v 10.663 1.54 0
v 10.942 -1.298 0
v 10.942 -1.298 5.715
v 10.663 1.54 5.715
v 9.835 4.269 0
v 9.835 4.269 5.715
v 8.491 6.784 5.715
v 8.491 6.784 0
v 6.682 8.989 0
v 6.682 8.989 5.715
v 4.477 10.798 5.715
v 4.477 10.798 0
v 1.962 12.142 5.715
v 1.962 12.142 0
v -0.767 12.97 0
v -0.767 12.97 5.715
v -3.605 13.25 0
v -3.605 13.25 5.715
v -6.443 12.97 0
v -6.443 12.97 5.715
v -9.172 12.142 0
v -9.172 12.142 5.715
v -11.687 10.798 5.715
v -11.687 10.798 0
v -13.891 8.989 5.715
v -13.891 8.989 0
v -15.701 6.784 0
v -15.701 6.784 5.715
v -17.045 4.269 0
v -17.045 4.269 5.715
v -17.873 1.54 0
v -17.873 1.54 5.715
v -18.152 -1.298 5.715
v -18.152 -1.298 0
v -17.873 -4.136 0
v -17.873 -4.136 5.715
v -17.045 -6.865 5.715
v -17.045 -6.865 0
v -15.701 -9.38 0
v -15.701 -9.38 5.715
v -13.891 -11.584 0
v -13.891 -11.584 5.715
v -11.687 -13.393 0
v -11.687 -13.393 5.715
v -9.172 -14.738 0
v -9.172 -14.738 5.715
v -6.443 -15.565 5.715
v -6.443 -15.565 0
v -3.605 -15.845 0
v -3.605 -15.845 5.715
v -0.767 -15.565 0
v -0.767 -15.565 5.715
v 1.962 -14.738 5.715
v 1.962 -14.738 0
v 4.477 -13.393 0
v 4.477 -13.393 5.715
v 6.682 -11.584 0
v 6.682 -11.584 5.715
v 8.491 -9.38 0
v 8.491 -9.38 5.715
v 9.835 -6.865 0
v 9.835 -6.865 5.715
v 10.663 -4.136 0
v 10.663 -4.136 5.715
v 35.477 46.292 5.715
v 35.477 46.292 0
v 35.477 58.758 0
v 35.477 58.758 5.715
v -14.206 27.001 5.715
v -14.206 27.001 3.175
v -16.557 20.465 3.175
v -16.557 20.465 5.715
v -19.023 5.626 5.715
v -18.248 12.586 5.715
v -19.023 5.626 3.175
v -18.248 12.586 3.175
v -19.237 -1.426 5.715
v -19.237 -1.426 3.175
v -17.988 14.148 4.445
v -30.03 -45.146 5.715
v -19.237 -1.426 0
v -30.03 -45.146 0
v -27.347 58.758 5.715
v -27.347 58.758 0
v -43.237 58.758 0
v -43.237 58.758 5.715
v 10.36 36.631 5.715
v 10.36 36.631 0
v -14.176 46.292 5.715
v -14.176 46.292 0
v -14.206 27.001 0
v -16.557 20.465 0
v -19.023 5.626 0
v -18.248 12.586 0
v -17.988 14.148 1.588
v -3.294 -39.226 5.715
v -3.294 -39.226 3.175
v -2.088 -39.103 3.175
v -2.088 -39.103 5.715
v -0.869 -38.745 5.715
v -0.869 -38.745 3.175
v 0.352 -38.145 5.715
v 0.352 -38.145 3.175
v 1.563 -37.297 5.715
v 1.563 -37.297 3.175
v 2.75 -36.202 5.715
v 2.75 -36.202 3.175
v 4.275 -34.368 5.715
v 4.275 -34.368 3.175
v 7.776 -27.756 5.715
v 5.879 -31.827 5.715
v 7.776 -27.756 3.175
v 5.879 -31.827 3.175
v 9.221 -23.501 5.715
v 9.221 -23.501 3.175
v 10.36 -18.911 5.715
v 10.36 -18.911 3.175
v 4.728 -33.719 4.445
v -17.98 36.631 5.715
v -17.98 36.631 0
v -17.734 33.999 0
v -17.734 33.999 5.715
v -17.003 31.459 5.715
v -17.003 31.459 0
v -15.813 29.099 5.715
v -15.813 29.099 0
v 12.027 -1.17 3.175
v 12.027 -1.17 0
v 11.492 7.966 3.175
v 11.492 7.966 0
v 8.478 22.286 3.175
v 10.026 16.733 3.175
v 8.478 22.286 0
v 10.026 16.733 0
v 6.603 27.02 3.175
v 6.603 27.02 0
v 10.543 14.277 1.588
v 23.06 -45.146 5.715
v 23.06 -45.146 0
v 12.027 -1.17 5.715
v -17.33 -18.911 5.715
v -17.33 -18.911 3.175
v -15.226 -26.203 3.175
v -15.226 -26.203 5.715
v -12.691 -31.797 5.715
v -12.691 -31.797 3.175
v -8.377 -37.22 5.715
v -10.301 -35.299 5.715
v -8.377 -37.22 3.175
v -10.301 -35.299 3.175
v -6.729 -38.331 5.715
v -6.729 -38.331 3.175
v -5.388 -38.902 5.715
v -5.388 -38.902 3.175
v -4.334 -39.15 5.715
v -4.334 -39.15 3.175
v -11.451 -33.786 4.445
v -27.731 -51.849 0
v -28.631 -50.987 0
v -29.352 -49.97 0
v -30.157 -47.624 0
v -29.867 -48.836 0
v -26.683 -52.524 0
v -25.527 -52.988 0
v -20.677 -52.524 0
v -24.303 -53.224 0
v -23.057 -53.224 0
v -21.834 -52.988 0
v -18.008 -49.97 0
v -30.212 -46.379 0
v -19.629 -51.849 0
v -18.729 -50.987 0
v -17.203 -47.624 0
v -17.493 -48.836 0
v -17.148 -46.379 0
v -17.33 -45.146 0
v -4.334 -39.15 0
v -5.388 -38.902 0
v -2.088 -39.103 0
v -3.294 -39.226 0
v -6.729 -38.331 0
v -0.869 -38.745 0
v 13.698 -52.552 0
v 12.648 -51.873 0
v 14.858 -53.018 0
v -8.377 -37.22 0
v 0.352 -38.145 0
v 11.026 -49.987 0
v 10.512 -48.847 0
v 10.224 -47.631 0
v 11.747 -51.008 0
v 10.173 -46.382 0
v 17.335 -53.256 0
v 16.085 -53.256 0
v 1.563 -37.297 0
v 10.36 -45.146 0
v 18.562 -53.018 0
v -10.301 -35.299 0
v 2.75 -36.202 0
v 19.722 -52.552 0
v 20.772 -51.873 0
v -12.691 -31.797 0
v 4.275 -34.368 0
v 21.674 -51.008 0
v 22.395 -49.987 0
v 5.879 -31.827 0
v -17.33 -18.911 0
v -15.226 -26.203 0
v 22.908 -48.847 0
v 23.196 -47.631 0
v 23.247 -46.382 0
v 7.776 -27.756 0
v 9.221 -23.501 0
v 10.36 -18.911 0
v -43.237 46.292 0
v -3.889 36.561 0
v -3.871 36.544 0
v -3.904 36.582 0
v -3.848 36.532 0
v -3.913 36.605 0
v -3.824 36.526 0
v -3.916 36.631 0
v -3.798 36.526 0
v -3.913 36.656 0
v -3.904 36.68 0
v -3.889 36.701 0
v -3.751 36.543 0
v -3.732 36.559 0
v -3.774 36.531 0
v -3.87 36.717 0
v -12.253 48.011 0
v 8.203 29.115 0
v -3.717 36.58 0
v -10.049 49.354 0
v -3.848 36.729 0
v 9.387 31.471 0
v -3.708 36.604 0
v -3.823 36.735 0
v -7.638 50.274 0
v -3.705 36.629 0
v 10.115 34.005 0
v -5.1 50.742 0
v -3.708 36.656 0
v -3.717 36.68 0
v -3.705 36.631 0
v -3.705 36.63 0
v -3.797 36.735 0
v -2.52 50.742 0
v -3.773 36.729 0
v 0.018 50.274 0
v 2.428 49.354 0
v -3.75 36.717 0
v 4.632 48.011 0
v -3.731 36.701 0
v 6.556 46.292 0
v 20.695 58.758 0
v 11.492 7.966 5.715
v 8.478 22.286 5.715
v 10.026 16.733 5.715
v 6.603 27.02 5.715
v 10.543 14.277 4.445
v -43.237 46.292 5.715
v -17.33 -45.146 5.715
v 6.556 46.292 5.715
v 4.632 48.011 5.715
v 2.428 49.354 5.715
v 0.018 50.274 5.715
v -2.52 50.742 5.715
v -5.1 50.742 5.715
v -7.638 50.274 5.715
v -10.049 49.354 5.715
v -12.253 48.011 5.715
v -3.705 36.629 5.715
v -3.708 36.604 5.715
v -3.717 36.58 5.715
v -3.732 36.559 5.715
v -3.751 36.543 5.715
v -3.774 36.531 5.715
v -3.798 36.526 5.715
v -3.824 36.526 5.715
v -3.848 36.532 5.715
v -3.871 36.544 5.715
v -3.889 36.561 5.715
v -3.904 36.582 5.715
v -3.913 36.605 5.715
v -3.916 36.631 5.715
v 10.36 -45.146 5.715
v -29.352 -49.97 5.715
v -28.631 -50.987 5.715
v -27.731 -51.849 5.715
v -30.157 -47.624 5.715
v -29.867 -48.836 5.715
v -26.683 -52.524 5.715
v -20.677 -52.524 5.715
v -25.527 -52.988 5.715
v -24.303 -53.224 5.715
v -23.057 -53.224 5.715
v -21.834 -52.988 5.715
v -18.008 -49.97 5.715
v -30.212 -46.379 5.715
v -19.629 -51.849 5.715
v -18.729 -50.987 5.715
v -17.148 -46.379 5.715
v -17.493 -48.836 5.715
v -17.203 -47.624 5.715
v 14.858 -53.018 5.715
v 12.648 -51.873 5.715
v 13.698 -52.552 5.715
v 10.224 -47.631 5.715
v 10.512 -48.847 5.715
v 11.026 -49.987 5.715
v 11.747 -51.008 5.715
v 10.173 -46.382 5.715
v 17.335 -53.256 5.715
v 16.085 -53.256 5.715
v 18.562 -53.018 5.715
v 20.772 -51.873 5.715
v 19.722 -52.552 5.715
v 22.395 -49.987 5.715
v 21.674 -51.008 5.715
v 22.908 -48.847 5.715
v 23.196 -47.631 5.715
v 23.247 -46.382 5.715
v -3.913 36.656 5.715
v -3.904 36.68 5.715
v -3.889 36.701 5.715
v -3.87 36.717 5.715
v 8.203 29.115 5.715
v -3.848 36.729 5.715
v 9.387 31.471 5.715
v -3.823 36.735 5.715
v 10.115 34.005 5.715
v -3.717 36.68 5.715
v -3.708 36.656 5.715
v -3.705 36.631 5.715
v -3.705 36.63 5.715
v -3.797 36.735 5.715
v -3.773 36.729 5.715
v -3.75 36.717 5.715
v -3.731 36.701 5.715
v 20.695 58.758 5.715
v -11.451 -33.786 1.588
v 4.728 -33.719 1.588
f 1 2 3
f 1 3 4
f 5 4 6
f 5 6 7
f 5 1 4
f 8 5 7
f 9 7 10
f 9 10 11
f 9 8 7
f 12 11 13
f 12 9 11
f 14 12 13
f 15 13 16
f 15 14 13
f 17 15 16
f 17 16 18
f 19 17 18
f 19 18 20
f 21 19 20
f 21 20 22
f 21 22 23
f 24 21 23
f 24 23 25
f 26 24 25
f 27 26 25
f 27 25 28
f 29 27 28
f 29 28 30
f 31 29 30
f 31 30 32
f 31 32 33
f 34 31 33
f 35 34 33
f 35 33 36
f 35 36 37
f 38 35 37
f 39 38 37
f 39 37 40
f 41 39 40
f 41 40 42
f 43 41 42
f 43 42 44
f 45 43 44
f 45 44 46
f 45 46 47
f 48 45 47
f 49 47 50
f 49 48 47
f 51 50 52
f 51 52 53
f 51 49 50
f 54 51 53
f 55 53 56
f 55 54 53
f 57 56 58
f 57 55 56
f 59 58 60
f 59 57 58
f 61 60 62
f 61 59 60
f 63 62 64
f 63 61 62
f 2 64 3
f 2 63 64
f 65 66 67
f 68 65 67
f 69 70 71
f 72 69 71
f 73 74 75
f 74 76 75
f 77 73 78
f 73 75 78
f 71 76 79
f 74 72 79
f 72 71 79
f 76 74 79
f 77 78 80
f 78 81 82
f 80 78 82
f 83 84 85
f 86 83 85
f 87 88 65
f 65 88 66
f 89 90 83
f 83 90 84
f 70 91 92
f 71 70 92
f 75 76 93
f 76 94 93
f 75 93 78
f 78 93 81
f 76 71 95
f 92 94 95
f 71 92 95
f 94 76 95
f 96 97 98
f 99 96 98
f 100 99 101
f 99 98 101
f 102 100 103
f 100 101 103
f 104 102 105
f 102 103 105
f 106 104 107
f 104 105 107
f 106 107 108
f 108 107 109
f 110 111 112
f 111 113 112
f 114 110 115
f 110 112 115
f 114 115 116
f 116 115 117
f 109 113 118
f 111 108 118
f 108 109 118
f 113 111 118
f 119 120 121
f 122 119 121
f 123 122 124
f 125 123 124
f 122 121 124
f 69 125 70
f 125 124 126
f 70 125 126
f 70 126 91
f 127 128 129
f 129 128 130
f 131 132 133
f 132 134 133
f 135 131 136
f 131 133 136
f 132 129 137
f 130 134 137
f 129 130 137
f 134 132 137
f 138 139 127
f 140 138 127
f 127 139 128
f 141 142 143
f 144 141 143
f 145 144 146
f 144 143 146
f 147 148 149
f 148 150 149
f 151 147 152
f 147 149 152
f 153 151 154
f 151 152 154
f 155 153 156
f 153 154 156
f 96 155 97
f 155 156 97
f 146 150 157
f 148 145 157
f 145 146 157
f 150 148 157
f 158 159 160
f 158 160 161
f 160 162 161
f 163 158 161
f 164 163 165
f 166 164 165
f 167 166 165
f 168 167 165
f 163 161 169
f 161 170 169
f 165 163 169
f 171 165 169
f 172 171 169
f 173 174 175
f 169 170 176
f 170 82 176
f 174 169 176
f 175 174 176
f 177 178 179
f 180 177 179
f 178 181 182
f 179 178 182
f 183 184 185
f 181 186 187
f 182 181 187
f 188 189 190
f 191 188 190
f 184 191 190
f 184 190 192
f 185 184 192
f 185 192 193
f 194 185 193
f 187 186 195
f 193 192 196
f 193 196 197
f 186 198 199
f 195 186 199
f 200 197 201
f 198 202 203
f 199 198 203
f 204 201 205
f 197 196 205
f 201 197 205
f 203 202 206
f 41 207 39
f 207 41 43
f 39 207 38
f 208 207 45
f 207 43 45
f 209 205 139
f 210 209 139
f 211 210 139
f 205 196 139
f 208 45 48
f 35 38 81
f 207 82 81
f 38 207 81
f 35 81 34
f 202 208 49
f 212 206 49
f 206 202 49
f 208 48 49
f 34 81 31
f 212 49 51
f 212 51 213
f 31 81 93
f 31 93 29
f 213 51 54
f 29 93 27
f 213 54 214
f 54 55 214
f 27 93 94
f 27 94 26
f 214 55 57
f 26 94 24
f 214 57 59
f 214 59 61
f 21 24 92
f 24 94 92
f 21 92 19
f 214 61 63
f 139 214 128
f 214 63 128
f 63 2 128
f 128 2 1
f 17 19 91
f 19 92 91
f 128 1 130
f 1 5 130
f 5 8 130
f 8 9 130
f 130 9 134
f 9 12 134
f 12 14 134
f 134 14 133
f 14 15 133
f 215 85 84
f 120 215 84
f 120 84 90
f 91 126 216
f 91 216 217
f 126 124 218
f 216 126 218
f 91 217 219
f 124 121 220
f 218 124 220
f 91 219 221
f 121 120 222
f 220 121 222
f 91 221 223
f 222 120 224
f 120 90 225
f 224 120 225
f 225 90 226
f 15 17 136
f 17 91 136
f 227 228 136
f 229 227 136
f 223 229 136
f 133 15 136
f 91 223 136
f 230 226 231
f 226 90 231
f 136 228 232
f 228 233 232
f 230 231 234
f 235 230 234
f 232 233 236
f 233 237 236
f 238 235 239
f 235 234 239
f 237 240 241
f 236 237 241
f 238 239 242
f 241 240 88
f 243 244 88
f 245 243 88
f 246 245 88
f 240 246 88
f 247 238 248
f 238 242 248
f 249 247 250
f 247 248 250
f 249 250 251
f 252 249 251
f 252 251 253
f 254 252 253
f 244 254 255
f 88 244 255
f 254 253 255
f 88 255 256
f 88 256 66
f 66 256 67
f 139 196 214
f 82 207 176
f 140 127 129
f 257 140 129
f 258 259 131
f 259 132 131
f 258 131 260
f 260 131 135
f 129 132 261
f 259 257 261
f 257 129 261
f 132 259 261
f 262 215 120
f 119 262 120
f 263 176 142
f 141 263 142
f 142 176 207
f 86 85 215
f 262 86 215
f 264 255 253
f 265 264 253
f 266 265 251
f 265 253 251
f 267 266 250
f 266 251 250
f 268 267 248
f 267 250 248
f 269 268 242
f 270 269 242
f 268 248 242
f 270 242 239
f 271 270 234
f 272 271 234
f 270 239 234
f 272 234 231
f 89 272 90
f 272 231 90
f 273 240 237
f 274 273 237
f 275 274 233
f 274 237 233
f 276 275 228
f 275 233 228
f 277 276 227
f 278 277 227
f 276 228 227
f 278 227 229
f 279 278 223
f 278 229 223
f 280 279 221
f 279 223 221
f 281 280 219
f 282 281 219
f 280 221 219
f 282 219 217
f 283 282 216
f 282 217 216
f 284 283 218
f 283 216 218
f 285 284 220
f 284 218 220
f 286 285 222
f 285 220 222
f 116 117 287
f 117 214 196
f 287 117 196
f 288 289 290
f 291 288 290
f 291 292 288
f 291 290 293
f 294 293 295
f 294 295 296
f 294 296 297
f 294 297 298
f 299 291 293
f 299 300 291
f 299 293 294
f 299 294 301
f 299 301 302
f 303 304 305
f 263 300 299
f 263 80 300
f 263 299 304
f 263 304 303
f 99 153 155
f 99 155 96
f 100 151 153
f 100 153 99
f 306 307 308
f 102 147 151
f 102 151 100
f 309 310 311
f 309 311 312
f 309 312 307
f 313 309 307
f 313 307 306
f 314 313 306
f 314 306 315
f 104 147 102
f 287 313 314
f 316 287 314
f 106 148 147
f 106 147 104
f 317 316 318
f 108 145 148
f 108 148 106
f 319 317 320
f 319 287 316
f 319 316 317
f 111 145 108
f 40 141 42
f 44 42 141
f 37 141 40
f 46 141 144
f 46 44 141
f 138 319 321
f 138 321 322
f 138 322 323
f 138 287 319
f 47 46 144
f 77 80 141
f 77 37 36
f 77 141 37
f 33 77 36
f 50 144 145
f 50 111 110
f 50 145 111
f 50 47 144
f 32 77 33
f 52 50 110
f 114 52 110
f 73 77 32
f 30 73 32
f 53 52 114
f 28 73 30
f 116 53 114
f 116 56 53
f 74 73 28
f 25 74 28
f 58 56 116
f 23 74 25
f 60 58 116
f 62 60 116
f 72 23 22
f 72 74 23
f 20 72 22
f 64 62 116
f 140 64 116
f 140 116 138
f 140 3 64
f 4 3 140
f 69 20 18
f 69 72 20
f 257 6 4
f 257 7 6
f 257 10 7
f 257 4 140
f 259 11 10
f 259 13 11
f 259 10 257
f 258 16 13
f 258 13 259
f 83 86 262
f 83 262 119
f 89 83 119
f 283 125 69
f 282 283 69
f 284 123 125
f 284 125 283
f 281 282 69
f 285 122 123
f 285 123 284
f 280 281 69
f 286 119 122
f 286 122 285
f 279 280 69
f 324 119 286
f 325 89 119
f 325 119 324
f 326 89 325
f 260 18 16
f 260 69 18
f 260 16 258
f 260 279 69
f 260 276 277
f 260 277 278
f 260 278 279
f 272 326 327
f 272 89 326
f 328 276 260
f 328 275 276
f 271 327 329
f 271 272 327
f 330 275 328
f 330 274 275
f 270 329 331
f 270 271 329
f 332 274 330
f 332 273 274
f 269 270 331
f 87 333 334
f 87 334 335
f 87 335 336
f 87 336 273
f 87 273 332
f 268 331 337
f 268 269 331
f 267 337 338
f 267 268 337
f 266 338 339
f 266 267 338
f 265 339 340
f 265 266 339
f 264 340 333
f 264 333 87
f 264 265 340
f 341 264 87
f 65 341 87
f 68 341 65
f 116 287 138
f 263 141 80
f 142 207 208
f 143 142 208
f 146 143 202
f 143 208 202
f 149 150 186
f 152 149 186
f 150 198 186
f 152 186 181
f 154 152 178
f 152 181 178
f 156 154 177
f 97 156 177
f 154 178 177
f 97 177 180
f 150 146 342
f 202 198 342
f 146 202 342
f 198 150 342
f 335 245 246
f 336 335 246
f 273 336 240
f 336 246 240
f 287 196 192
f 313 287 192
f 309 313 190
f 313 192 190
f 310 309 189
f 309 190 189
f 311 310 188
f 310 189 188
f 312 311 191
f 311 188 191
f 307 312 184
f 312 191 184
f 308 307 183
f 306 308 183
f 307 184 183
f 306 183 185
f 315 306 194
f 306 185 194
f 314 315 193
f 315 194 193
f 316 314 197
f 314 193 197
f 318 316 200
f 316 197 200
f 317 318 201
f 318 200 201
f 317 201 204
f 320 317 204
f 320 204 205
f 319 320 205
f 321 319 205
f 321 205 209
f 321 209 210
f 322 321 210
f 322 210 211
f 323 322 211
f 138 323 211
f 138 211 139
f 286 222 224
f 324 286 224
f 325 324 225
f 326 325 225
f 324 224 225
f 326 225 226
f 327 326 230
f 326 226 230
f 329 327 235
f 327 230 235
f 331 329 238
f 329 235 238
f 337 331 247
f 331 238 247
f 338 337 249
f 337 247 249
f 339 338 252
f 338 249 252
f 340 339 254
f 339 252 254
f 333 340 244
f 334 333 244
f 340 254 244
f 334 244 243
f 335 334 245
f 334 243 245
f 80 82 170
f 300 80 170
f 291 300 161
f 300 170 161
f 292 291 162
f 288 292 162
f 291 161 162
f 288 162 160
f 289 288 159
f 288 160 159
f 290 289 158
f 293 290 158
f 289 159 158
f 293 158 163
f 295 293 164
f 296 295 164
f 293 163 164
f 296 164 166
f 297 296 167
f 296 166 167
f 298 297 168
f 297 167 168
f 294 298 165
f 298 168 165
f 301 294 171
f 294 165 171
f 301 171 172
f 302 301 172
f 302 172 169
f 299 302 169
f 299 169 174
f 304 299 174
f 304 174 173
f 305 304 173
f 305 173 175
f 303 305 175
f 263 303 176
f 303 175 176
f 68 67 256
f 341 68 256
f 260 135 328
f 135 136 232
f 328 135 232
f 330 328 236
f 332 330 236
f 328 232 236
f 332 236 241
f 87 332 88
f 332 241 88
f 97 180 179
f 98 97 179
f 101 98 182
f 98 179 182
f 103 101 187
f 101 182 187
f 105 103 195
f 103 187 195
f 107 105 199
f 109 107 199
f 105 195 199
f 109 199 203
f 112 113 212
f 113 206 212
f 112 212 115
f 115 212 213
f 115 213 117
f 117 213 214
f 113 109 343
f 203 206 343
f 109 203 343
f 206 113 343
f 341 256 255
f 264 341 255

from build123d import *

# Parameters (mm, degrees)
F0_R     = 14.5472790553
F1_DEPTH = 3.175
F2_DEPTH = 5.715


with BuildPart() as f1:
    # F0 (on Top) → F1 (new body)
    with BuildSketch(Plane.XY):
        with BuildLine():
            add(Edge.make_bspline(
                [(-17.3302307441, -18.9114744135), (-12.7840517895, -39.3035737815), (-3.2940015008, -39.2257868182)],
                knots=[5.1919648614, 5.1919648614, 5.1919648614, 6.2831853072, 6.2831853072, 6.2831853072], degree=2, weights=[1, 0.854810781, 1]))
            add(Edge.make_bspline(
                [(-3.2940015008, -39.2257868182), (6.123923112, -39.1485910465), (10.3601545856, -18.9114744135)],
                knots=[0, 0, 0, 1.0844638725, 1.0844638725, 1.0844638725], degree=2, weights=[1, 0.8565590272, 1]))
            add(Edge.make_bspline(
                [(10.3601545856, -18.9114744135), (12.1044870422, -10.5785351982), (12.0273641605, -1.1695031996)],
                knots=[1.0844638725, 1.0844638725, 1.0844638725, 1.5707963268, 1.5707963268, 1.5707963268], degree=2, weights=[1, 0.9705804868, 1]))
            add(Edge.make_bspline(
                [(12.0273641605, -1.1695031996), (11.88861373, 15.7581220548), (6.6027932897, 27.0196823223)],
                knots=[1.5707963268, 1.5707963268, 1.5707963268, 2.4103546369, 2.4103546369, 2.4103546369], degree=2, weights=[1, 0.9131789699, 1]))
            ThreePointArc((6.6027932897, 27.0196823223), (-3.7977289586, 22.4602209118), (-14.2062252861, 27.0014493351))
            add(Edge.make_bspline(
                [(-14.2062252861, 27.0014493351), (-19.3770142282, 15.6392708689), (-19.2371374573, -1.4257685052)],
                knots=[3.8667963971, 3.8667963971, 3.8667963971, 4.7123889804, 4.7123889804, 4.7123889804], degree=2, weights=[1, 0.9119451548, 1]))
            add(Edge.make_bspline(
                [(-19.2371374573, -1.4257685052), (-19.1611285396, -10.6988963006), (-17.3302307441, -18.9114744135)],
                knots=[4.7123889804, 4.7123889804, 4.7123889804, 5.1919648614, 5.1919648614, 5.1919648614], degree=2, weights=[1, 0.9713883601, 1]))
        make_face()
        with Locations((-3.6048866484, -1.2976358524)):
            Circle(F0_R, mode=Mode.SUBTRACT)
    extrude(amount=F1_DEPTH)

    # F0 (on Top) → F2 (join)
    with BuildSketch(Plane.XY):
        with BuildLine():
            add(Edge.make_bspline(
                [(-17.3302307441, -18.9114744135), (-12.7840517895, -39.3035737815), (-3.2940015008, -39.2257868182)],
                knots=[5.1919648614, 5.1919648614, 5.1919648614, 6.2831853072, 6.2831853072, 6.2831853072], degree=2, weights=[1, 0.854810781, 1]))
            add(Edge.make_bspline(
                [(-3.2940015008, -39.2257868182), (6.123923112, -39.1485910465), (10.3601545856, -18.9114744135)],
                knots=[0, 0, 0, 1.0844638725, 1.0844638725, 1.0844638725], degree=2, weights=[1, 0.8565590272, 1]))
            add(Edge.make_bspline(
                [(10.3601545856, -18.9114744135), (12.1044870422, -10.5785351982), (12.0273641605, -1.1695031996)],
                knots=[1.0844638725, 1.0844638725, 1.0844638725, 1.5707963268, 1.5707963268, 1.5707963268], degree=2, weights=[1, 0.9705804868, 1]))
            add(Edge.make_bspline(
                [(12.0273641605, -1.1695031996), (11.88861373, 15.7581220548), (6.6027932897, 27.0196823223)],
                knots=[1.5707963268, 1.5707963268, 1.5707963268, 2.4103546369, 2.4103546369, 2.4103546369], degree=2, weights=[1, 0.9131789699, 1]))
            ThreePointArc((6.6027932897, 27.0196823223), (-3.7977289586, 22.4602209118), (-14.2062252861, 27.0014493351))
            add(Edge.make_bspline(
                [(-14.2062252861, 27.0014493351), (-19.3770142282, 15.6392708689), (-19.2371374573, -1.4257685052)],
                knots=[3.8667963971, 3.8667963971, 3.8667963971, 4.7123889804, 4.7123889804, 4.7123889804], degree=2, weights=[1, 0.9119451548, 1]))
            add(Edge.make_bspline(
                [(-19.2371374573, -1.4257685052), (-19.1611285396, -10.6988963006), (-17.3302307441, -18.9114744135)],
                knots=[4.7123889804, 4.7123889804, 4.7123889804, 5.1919648614, 5.1919648614, 5.1919648614], degree=2, weights=[1, 0.9713883601, 1]))
        make_face()
        with Locations((-3.6048866484, -1.2976358524)):
            Circle(F0_R, mode=Mode.SUBTRACT)
        with BuildLine():
            add(Edge.make_bspline(
                [(10.3601545856, -18.9114744135), (12.1044870422, -10.5785351982), (12.0273641605, -1.1695031996)],
                knots=[1.0844638725, 1.0844638725, 1.0844638725, 1.5707963268, 1.5707963268, 1.5707963268], degree=2, weights=[1, 0.9705804868, 1]))
            Line((10.3601545856, -18.9114744135), (10.3601545856, -45.1457377323))
            Line((10.3601545856, -45.1457377323), (23.0601545856, -45.1457377323))
            Line((23.0601545856, -45.1457377323), (12.0273641605, -1.1695031996))
        make_face()
        with BuildLine():
            Line((-17.3302307441, -45.1457377323), (-17.3302307441, -18.9114744135))
            add(Edge.make_bspline(
                [(-19.2371374573, -1.4257685052), (-19.1611285396, -10.6988963006), (-17.3302307441, -18.9114744135)],
                knots=[4.7123889804, 4.7123889804, 4.7123889804, 5.1919648614, 5.1919648614, 5.1919648614], degree=2, weights=[1, 0.9713883601, 1]))
            Line((-19.2371374573, -1.4257685052), (-30.0302307441, -45.1457377323))
            Line((-30.0302307441, -45.1457377323), (-17.3302307441, -45.1457377323))
        make_face()
        with BuildLine():
            Line((23.0601545856, -45.1457377323), (10.3601545856, -45.1457377323))
            ThreePointArc((10.3601545856, -45.1457377323), (16.7101545856, -53.2856193183), (23.0601545856, -45.1457377323))
        make_face()
        with BuildLine():
            ThreePointArc((-30.0302307441, -45.1457377323), (-23.6802307441, -53.2539903225), (-17.3302307441, -45.1457377323))
            Line((-17.3302307441, -45.1457377323), (-30.0302307441, -45.1457377323))
        make_face()
        with BuildLine():
            ThreePointArc((-14.2062252861, 27.0014493351), (-3.7977289586, 22.4602209118), (6.6027932897, 27.0196823223))
            add(Edge.make_bspline(
                [(6.6027932897, 27.0196823223), (2.1602516195, 36.4846180548), (-3.704532498, 36.6287842303)],
                knots=[2.4103546369, 2.4103546369, 2.4103546369, 3.1280810135, 3.1280810135, 3.1280810135], degree=2, weights=[1, 0.9362966883, 1]))
            ThreePointArc((-3.704532498, 36.6287842303), (-3.8110105262, 36.5248919189), (-3.9157717959, 36.6305151135))
            add(Edge.make_bspline(
                [(-3.9157717959, 36.6305151135), (-9.8462768465, 36.5819046252), (-14.2062252861, 27.0014493351)],
                knots=[3.1415926536, 3.1415926536, 3.1415926536, 3.8667963971, 3.8667963971, 3.8667963971], degree=2, weights=[1, 0.9349770844, 1]))
        make_face()
        with BuildLine():
            add(Edge.make_bspline(
                [(6.6027932897, 27.0196823223), (2.1602516195, 36.4846180548), (-3.704532498, 36.6287842303)],
                knots=[2.4103546369, 2.4103546369, 2.4103546369, 3.1280810135, 3.1280810135, 3.1280810135], degree=2, weights=[1, 0.9362966883, 1]))
            ThreePointArc((6.6027932897, 27.0196823223), (9.387427608, 31.4709155445), (10.3601545856, 36.6305151135))
            ThreePointArc((10.3601545856, 36.6305151135), (9.3748938948, 41.8220601436), (6.55612214, 46.2916691))
            ThreePointArc((6.55612214, 46.2916691), (-3.8101450556, 50.8008147547), (-14.1764122512, 46.2916691))
            ThreePointArc((-14.1764122512, 46.2916691), (-16.9951840059, 41.8220601436), (-17.9804446968, 36.6305151135))
            ThreePointArc((-17.9804446968, 36.6305151135), (-17.0031917826, 31.459353737), (-14.2062252861, 27.0014493351))
            add(Edge.make_bspline(
                [(-3.9157717959, 36.6305151135), (-9.8462768465, 36.5819046252), (-14.2062252861, 27.0014493351)],
                knots=[3.1415926536, 3.1415926536, 3.1415926536, 3.8667963971, 3.8667963971, 3.8667963971], degree=2, weights=[1, 0.9349770844, 1]))
            ThreePointArc((-3.9157717959, 36.6305151135), (-3.8101450556, 36.7361418538), (-3.7045183152, 36.6305151135))
            ThreePointArc((-3.7045183152, 36.6305151135), (-3.704521861, 36.6296496428), (-3.704532498, 36.6287842303))
        make_face()
        with BuildLine():
            ThreePointArc((6.55612214, 46.2916691), (9.3748938948, 41.8220601436), (10.3601545856, 36.6305151135))
            Line((10.3601545856, 36.6305151135), (35.4768335819, 46.2916691))
            Line((35.4768335819, 46.2916691), (35.4768335819, 58.7584972382))
            Line((35.4768335819, 58.7584972382), (20.6948220729, 58.7584972382))
            Line((20.6948220729, 58.7584972382), (6.55612214, 46.2916691))
        make_face()
        with BuildLine():
            Line((-43.2374104858, 46.2916691), (-17.9804446968, 36.6305151135))
            ThreePointArc((-17.9804446968, 36.6305151135), (-16.9951840059, 41.8220601436), (-14.1764122512, 46.2916691))
            Line((-14.1764122512, 46.2916691), (-27.3467302323, 58.7584972382))
            Line((-27.3467302323, 58.7584972382), (-43.2374104858, 58.7584972382))
            Line((-43.2374104858, 58.7584972382), (-43.2374104858, 46.2916691))
        make_face()
    extrude(amount=F2_DEPTH)


solid = f1.part
